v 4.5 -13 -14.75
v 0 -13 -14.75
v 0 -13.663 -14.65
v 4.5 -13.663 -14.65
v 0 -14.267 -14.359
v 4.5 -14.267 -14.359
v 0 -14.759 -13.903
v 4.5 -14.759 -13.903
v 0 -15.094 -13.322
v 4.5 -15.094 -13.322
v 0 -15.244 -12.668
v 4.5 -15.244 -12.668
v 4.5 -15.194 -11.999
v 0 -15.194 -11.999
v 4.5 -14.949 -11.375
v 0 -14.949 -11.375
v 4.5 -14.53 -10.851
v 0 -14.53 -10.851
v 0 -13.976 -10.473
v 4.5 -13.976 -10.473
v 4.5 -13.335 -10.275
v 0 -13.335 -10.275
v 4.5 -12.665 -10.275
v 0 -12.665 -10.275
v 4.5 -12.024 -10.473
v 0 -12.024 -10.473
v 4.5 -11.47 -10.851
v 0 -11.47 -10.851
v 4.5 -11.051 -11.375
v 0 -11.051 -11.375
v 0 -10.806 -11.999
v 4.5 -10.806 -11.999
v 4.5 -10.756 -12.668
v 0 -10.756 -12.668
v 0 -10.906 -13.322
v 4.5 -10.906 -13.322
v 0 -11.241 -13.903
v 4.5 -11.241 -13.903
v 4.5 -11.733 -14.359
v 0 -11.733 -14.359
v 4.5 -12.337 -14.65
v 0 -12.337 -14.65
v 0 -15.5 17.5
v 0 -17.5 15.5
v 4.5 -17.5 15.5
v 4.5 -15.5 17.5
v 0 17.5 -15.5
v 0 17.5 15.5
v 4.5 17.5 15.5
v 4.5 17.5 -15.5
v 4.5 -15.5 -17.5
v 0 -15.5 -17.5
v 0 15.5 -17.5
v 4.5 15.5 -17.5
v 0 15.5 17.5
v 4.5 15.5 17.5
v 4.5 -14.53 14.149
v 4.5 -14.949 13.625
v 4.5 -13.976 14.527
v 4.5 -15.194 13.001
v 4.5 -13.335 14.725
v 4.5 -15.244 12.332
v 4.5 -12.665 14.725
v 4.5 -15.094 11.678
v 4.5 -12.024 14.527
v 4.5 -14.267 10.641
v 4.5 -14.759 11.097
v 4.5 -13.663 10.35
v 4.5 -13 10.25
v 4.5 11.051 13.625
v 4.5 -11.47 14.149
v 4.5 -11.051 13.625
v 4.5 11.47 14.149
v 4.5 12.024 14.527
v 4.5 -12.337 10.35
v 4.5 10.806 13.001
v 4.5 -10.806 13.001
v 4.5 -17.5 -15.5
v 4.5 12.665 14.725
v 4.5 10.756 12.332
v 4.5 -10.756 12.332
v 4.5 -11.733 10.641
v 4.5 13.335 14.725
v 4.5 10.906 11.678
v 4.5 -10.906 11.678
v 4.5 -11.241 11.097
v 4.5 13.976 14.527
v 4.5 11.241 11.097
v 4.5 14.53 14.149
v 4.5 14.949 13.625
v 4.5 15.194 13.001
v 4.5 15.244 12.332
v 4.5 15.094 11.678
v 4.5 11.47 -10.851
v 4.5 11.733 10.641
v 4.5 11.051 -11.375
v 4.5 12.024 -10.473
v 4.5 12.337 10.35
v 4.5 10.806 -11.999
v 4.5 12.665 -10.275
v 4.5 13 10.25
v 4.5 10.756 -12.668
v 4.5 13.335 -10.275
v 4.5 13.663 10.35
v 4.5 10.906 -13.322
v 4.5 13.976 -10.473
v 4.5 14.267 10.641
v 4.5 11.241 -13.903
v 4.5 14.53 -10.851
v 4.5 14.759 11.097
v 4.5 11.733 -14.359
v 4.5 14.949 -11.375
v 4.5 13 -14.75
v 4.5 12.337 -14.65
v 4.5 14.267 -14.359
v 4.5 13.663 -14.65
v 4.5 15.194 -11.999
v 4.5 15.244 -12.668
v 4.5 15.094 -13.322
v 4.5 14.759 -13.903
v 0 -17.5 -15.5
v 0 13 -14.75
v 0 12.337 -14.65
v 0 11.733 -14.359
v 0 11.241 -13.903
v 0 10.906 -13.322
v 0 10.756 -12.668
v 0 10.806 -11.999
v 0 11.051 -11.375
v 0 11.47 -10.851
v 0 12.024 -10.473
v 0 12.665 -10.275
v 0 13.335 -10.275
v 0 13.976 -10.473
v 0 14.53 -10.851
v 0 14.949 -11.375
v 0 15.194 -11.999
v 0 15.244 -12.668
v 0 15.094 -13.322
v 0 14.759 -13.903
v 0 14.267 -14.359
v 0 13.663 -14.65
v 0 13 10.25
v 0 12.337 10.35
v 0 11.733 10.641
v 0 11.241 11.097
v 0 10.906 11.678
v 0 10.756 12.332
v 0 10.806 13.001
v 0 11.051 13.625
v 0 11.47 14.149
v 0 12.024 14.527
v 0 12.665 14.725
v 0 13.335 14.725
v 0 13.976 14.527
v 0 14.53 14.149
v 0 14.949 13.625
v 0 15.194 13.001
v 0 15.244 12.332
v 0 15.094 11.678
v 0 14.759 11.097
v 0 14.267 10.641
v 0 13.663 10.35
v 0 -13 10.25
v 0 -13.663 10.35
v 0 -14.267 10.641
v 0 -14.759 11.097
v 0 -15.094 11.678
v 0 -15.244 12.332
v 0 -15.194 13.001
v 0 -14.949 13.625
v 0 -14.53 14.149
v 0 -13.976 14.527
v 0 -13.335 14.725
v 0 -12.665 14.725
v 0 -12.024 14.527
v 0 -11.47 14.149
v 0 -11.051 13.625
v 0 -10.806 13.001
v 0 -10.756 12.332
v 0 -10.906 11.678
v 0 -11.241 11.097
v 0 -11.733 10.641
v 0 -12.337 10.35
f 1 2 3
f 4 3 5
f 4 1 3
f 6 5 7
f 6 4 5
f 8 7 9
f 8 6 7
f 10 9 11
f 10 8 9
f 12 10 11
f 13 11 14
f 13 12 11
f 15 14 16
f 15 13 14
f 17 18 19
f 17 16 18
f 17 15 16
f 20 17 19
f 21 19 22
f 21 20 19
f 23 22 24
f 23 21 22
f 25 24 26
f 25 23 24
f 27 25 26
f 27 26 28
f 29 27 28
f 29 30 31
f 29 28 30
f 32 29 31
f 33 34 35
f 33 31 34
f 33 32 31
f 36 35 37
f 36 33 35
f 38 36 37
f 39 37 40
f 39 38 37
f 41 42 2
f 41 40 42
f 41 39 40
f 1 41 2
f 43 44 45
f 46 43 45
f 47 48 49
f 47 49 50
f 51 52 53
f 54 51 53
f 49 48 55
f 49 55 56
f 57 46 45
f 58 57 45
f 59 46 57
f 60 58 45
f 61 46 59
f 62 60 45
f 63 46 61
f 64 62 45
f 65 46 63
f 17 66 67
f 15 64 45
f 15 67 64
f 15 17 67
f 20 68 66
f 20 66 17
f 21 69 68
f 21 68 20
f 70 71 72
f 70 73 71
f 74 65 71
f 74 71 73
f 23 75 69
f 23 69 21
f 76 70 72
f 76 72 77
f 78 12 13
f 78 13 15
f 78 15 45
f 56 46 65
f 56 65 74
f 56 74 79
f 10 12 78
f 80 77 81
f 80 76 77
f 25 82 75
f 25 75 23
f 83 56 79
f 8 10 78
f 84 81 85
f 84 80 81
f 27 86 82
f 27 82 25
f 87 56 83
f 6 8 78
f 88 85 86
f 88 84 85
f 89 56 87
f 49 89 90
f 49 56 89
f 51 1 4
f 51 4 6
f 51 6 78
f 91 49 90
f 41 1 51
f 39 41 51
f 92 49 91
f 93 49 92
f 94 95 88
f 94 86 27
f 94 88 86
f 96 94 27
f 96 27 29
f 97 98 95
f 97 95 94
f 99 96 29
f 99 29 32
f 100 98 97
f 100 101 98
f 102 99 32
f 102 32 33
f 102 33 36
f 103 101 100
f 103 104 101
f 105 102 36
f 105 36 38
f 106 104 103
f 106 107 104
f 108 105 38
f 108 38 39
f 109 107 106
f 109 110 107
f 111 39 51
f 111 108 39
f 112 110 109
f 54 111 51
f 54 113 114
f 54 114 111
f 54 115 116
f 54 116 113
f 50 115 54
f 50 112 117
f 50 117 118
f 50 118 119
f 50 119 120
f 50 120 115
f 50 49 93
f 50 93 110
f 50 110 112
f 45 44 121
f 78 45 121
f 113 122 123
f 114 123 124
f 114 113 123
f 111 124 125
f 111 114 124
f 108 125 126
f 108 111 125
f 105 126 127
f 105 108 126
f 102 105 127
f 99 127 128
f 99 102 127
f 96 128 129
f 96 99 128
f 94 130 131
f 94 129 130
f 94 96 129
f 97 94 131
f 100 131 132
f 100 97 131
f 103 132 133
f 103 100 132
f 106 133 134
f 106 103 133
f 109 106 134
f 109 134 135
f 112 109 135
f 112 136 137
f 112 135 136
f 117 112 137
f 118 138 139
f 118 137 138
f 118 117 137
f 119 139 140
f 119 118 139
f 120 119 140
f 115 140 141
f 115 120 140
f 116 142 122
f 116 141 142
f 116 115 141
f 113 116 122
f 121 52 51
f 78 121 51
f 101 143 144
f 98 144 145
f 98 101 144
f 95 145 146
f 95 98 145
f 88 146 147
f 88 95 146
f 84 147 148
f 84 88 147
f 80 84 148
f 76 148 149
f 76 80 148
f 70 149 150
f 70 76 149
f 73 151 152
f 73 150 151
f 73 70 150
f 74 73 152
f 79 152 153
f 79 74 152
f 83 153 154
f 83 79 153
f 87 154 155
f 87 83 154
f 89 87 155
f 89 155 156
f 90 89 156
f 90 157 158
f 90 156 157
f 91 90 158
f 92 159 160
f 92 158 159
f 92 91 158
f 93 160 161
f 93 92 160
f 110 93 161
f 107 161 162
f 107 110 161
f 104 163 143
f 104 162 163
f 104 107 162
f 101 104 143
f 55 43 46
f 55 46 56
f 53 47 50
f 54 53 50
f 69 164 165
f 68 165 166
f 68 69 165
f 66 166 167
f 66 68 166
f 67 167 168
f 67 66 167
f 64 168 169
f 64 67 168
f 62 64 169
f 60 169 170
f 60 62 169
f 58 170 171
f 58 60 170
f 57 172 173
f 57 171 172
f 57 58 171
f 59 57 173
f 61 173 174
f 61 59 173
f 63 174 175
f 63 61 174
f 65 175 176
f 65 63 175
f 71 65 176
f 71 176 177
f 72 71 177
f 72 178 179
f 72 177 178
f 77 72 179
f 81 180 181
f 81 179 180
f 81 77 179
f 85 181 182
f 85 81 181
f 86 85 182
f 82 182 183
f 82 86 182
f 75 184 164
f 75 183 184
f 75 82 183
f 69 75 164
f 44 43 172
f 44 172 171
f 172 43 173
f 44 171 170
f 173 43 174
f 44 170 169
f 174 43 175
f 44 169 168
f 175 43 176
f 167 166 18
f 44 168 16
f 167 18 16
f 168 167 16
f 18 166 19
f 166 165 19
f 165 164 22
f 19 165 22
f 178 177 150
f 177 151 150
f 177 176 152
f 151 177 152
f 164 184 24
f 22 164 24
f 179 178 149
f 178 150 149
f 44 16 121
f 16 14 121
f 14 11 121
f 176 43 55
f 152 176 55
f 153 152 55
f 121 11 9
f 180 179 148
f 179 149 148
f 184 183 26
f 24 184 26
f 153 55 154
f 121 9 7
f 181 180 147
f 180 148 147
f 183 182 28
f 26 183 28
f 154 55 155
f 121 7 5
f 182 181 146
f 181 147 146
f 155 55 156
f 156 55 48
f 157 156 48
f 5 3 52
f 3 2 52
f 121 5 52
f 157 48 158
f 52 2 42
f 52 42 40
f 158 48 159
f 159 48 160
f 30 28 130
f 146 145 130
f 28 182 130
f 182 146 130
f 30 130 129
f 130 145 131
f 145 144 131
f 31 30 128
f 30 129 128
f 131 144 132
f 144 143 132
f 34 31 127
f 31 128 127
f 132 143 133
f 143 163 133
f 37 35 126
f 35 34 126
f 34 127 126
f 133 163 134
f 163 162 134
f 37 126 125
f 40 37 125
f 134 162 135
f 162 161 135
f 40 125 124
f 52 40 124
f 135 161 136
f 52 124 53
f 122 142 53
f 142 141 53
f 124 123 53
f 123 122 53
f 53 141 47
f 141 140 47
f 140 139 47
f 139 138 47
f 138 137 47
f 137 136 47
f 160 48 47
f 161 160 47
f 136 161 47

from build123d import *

# Parameters (mm, degrees)
SKETCH_1_W                  = 35
SKETCH_1_H                  = 35
EXTRUDE_1_DEPTH             = 4.5
CHAMFER_1_SIZE              = 2
PATTERN_LINEAR_1_COUNT      = 2
PATTERN_LINEAR_1_PITCH      = 25
PATTERN_LINEAR_1_COUNT_DIR2 = 2
PATTERN_LINEAR_1_PITCH_DIR2 = 26


with BuildPart() as part:
    # Эскиз1 → Бобышка-Вытянуть1 (new body)
    with BuildSketch(Plane(origin=(0, 0, 0), x_dir=(0, 0, -1), z_dir=(1, 0, 0))):
        Rectangle(SKETCH_1_W, SKETCH_1_H)
    extrude(amount=EXTRUDE_1_DEPTH)

    # Фаска1
    chamfer_1_edges = [part.edges().sort_by_distance(p)[0] for p in [
        (2.25, -17.5, -17.5),
        (2.25, -17.5, 17.5),
        (2.25, 17.5, 17.5),
        (2.25, 17.5, -17.5),
    ]]
    chamfer(chamfer_1_edges, length=CHAMFER_1_SIZE)

    # Эскиз3 → Отверстие с зазором M41 (revolve, cut)
    with BuildSketch(Plane(origin=(4.5, 13, -12.5), x_dir=(0, 0, -1), z_dir=(0, 1, 0))):
        Polygon((0, 0), (0, 21.351936393), (2.25, 20), (2.25, 0), align=None)
    hole_wizard_m41 = revolve(axis=Axis((10.85, 13, -12.5), (-1, 0, 0)), mode=Mode.SUBTRACT)

    # Линейный массив1: Hole Wizard M41 2 × 2
    with Locations(*[(0, -j * PATTERN_LINEAR_1_PITCH_DIR2, i * PATTERN_LINEAR_1_PITCH) for i in range(PATTERN_LINEAR_1_COUNT) for j in range(PATTERN_LINEAR_1_COUNT_DIR2) if (i, j) != (0, 0)]):
        add(hole_wizard_m41, mode=Mode.SUBTRACT)


solid = part.part
